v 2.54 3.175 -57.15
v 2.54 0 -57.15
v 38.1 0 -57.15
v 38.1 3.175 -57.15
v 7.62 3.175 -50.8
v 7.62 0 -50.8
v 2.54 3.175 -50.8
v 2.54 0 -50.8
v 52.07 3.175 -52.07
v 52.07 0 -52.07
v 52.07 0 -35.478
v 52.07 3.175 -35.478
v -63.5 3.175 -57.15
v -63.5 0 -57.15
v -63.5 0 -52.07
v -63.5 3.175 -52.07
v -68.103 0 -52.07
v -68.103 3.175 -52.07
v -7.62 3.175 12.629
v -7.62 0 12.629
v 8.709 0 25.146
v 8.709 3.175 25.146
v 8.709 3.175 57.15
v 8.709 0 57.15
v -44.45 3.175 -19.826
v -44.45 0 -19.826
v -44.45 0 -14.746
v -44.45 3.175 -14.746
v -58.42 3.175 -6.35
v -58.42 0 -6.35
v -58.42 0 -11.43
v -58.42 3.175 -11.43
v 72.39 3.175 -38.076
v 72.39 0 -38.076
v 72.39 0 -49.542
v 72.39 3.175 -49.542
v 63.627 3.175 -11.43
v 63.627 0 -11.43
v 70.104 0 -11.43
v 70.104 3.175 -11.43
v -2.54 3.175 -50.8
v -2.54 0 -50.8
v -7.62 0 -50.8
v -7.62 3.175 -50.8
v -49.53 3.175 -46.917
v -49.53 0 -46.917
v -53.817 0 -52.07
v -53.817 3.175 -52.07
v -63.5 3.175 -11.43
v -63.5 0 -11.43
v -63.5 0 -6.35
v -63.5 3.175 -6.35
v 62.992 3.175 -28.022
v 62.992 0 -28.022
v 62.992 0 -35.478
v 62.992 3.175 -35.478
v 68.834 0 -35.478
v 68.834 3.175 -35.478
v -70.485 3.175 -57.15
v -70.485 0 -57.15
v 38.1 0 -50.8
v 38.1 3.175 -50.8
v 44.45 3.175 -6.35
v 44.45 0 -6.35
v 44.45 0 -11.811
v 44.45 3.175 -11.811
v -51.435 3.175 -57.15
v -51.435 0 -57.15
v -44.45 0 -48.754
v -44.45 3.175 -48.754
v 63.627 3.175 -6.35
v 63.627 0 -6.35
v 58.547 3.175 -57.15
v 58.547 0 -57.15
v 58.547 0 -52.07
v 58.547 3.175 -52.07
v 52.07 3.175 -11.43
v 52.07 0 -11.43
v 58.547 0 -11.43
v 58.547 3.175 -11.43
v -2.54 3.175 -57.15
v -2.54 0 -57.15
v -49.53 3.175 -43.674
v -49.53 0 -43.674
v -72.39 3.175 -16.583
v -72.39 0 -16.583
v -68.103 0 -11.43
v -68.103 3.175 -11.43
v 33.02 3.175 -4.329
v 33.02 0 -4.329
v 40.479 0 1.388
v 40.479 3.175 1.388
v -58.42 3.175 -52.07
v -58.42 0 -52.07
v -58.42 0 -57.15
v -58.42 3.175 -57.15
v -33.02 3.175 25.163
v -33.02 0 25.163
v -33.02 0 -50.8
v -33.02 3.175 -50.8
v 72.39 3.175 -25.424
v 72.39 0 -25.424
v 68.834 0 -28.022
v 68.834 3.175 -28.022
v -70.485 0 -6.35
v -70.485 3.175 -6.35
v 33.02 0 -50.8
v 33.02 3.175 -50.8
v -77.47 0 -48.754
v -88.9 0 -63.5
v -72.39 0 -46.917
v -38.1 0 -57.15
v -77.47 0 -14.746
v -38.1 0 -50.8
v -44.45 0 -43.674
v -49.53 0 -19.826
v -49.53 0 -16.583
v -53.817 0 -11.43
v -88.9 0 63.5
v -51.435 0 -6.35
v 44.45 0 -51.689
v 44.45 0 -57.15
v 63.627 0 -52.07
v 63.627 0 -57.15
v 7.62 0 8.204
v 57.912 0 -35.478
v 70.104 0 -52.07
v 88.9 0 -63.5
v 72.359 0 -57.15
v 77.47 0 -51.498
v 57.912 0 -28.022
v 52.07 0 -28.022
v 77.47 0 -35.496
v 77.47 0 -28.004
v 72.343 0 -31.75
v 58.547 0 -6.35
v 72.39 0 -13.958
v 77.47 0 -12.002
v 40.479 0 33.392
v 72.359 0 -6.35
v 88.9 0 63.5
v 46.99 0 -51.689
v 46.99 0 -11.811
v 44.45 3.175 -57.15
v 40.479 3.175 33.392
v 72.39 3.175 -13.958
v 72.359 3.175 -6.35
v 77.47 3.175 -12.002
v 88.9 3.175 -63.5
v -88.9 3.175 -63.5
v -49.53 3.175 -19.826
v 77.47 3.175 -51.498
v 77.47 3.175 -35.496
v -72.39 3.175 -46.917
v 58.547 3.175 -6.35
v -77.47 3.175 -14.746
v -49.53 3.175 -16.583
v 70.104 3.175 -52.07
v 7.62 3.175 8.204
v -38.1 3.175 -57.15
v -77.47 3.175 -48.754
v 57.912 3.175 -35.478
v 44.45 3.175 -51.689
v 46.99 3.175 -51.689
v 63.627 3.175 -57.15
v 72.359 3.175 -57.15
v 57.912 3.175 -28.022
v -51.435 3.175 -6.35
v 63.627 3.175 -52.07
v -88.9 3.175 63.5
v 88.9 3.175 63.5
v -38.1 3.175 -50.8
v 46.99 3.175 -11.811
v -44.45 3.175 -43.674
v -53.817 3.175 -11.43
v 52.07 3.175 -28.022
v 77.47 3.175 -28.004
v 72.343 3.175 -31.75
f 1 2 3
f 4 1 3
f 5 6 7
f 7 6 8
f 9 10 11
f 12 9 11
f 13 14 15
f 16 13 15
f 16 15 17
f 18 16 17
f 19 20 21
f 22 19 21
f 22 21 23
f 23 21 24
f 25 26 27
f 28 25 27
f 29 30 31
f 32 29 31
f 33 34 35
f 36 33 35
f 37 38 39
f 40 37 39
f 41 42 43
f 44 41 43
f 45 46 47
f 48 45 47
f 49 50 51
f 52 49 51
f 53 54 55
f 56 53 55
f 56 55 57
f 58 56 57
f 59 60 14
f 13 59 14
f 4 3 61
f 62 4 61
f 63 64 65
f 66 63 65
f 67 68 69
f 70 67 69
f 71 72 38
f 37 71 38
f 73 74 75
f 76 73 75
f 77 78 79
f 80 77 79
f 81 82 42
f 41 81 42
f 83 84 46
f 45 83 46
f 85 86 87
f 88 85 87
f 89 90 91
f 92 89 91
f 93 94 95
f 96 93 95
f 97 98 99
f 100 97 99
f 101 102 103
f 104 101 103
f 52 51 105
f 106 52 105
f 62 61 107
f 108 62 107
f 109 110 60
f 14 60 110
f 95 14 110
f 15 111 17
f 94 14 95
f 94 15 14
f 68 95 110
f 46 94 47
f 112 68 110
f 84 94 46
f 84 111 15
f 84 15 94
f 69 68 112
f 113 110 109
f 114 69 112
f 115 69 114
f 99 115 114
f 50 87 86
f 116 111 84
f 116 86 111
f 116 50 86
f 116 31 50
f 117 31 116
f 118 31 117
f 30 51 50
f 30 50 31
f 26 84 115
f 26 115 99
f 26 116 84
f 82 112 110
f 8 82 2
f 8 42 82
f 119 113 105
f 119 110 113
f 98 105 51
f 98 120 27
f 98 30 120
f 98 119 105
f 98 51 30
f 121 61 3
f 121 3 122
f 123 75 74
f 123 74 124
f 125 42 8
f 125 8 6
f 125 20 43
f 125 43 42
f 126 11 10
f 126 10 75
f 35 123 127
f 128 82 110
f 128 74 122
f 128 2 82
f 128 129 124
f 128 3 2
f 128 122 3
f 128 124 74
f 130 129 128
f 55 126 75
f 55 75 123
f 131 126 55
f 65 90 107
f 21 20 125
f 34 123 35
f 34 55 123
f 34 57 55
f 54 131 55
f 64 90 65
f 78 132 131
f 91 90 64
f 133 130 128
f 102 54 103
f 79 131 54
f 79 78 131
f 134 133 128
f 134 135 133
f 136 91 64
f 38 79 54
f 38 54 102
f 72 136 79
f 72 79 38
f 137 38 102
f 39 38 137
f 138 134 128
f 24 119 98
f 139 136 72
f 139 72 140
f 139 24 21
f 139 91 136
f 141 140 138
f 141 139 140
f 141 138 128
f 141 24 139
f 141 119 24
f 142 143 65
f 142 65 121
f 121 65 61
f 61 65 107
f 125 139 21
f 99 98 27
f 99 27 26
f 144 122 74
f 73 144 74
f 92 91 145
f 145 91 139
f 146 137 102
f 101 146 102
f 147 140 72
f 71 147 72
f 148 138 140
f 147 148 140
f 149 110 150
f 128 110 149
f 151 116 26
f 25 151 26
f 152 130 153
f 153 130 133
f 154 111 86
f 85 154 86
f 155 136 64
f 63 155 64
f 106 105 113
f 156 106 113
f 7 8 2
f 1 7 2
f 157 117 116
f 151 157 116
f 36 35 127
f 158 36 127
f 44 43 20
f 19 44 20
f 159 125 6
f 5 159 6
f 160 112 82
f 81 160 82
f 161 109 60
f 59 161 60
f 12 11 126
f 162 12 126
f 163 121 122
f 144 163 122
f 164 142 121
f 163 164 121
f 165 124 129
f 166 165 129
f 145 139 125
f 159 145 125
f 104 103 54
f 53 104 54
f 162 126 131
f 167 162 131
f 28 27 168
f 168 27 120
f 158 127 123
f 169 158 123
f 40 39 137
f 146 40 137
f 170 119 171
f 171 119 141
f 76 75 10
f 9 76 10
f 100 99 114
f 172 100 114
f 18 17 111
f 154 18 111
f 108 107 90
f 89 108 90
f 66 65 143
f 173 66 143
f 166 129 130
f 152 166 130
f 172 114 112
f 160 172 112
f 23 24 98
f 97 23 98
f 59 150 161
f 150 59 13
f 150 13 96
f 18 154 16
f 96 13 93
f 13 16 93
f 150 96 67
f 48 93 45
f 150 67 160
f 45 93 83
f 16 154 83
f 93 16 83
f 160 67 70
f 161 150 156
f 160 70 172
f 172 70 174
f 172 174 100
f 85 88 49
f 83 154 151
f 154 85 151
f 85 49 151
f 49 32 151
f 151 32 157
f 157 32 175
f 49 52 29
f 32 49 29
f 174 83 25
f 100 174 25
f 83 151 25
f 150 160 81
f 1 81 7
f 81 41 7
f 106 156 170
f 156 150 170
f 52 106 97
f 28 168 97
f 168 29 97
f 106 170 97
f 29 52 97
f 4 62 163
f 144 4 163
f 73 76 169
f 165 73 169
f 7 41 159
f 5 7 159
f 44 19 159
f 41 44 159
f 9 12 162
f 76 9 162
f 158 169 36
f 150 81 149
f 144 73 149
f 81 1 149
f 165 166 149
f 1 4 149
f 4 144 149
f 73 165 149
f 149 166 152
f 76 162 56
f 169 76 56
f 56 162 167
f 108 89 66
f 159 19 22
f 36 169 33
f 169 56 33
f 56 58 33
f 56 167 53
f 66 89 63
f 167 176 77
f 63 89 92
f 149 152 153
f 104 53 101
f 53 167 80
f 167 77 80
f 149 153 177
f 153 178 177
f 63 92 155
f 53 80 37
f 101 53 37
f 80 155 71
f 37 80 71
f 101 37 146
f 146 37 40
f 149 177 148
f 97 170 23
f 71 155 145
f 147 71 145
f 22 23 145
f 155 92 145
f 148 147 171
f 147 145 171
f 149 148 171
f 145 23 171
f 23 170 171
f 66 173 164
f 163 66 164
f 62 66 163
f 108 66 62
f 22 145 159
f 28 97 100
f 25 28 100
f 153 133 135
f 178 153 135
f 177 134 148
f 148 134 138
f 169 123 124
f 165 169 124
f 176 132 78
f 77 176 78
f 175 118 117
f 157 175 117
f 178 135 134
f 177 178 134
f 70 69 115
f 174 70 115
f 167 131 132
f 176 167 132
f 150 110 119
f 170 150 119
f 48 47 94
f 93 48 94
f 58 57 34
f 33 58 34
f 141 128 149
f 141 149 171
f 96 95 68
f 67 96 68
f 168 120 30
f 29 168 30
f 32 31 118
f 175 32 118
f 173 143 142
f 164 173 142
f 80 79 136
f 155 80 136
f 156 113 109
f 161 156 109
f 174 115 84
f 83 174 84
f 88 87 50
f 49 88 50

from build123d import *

# Parameters (mm, degrees)
F0_W     = 177.8
F0_H     = 127
F1_DEPTH = 3.175
F3_DEPTH = 3.175
F5_DEPTH = 3.175


with BuildPart() as f1:
    # F0 (on Front) → F1 (new body)
    with BuildSketch(Plane.XZ):
        Rectangle(F0_W, F0_H)
    extrude(amount=-F1_DEPTH)

    # F2 (on face) → F3 (cut, through all)
    with BuildSketch(Plane.XZ):
        Polygon((-38.1, -50.8), (-38.1, -57.15), (-2.54, -57.15), (-2.54, -50.8), (-7.62, -50.8), (-33.02, -50.8), align=None)
        Polygon((-33.02, 25.162934), (-33.02, -50.8), (-7.62, -50.8), (-7.62, 12.629322), (8.708571, 25.146), (8.708571, 57.15), align=None)
        Polygon((2.54, -57.15), (38.1, -57.15), (38.1, -50.8), (33.02, -50.8), (7.62, -50.8), (2.54, -50.8), align=None)
        Polygon((7.62, -50.8), (33.02, -50.8), (33.02, -4.329412), (40.47873, 1.388083), (40.47873, 33.392083), (7.62, 8.2042), align=None)
    extrude(amount=-F3_DEPTH, mode=Mode.SUBTRACT)

    # F4 (on face) → F5 (cut, through all)
    with BuildSketch(Plane.XZ):
        Polygon((-77.47, -14.746419), (-77.47, -31.75), (-77.47, -48.753581), (-70.485, -57.15), (-63.5, -57.15), (-63.5, -52.07), (-68.103037, -52.07), (-72.39, -46.916795), (-72.39, -31.75), (-72.39, -16.583205), (-68.103037, -11.43), (-63.5, -11.43), (-63.5, -6.35), (-70.485, -6.35), align=None)
        Polygon((-44.45, -14.746419), (-51.435, -6.35), (-58.42, -6.35), (-58.42, -11.43), (-53.816963, -11.43), (-49.53, -16.583205), (-49.53, -19.826419), (-44.45, -19.826419), align=None)
        Polygon((-58.42, -57.15), (-51.435, -57.15), (-44.45, -48.753581), (-44.45, -43.673581), (-49.53, -43.673581), (-49.53, -46.916795), (-53.816963, -52.07), (-58.42, -52.07), align=None)
        Polygon((58.547, -6.35), (44.45, -6.35), (44.45, -11.811), (46.99, -11.811), (46.99, -31.75), (46.99, -51.689), (44.45, -51.689), (44.45, -57.15), (58.547, -57.15), (58.547, -52.07), (52.07, -52.07), (52.07, -35.478037), (57.912, -35.478037), (57.912, -28.021963), (52.07, -28.021963), (52.07, -11.43), (58.547, -11.43), align=None)
        Polygon((77.47, -12.002101), (72.359407, -6.35), (63.627, -6.35), (63.627, -11.43), (70.104, -11.43), (72.39, -13.95822), (72.39, -25.424098), (68.834, -28.021963), (62.992, -28.021963), (62.992, -35.478037), (68.834, -35.478037), (72.39, -38.075902), (72.39, -49.54178), (70.104, -52.07), (63.627, -52.07), (63.627, -57.15), (72.359407, -57.15), (77.47, -51.497899), (77.47, -35.495899), (72.342551, -31.75), (77.47, -28.004101), align=None)
    extrude(amount=-F5_DEPTH, mode=Mode.SUBTRACT)


solid = f1.part
